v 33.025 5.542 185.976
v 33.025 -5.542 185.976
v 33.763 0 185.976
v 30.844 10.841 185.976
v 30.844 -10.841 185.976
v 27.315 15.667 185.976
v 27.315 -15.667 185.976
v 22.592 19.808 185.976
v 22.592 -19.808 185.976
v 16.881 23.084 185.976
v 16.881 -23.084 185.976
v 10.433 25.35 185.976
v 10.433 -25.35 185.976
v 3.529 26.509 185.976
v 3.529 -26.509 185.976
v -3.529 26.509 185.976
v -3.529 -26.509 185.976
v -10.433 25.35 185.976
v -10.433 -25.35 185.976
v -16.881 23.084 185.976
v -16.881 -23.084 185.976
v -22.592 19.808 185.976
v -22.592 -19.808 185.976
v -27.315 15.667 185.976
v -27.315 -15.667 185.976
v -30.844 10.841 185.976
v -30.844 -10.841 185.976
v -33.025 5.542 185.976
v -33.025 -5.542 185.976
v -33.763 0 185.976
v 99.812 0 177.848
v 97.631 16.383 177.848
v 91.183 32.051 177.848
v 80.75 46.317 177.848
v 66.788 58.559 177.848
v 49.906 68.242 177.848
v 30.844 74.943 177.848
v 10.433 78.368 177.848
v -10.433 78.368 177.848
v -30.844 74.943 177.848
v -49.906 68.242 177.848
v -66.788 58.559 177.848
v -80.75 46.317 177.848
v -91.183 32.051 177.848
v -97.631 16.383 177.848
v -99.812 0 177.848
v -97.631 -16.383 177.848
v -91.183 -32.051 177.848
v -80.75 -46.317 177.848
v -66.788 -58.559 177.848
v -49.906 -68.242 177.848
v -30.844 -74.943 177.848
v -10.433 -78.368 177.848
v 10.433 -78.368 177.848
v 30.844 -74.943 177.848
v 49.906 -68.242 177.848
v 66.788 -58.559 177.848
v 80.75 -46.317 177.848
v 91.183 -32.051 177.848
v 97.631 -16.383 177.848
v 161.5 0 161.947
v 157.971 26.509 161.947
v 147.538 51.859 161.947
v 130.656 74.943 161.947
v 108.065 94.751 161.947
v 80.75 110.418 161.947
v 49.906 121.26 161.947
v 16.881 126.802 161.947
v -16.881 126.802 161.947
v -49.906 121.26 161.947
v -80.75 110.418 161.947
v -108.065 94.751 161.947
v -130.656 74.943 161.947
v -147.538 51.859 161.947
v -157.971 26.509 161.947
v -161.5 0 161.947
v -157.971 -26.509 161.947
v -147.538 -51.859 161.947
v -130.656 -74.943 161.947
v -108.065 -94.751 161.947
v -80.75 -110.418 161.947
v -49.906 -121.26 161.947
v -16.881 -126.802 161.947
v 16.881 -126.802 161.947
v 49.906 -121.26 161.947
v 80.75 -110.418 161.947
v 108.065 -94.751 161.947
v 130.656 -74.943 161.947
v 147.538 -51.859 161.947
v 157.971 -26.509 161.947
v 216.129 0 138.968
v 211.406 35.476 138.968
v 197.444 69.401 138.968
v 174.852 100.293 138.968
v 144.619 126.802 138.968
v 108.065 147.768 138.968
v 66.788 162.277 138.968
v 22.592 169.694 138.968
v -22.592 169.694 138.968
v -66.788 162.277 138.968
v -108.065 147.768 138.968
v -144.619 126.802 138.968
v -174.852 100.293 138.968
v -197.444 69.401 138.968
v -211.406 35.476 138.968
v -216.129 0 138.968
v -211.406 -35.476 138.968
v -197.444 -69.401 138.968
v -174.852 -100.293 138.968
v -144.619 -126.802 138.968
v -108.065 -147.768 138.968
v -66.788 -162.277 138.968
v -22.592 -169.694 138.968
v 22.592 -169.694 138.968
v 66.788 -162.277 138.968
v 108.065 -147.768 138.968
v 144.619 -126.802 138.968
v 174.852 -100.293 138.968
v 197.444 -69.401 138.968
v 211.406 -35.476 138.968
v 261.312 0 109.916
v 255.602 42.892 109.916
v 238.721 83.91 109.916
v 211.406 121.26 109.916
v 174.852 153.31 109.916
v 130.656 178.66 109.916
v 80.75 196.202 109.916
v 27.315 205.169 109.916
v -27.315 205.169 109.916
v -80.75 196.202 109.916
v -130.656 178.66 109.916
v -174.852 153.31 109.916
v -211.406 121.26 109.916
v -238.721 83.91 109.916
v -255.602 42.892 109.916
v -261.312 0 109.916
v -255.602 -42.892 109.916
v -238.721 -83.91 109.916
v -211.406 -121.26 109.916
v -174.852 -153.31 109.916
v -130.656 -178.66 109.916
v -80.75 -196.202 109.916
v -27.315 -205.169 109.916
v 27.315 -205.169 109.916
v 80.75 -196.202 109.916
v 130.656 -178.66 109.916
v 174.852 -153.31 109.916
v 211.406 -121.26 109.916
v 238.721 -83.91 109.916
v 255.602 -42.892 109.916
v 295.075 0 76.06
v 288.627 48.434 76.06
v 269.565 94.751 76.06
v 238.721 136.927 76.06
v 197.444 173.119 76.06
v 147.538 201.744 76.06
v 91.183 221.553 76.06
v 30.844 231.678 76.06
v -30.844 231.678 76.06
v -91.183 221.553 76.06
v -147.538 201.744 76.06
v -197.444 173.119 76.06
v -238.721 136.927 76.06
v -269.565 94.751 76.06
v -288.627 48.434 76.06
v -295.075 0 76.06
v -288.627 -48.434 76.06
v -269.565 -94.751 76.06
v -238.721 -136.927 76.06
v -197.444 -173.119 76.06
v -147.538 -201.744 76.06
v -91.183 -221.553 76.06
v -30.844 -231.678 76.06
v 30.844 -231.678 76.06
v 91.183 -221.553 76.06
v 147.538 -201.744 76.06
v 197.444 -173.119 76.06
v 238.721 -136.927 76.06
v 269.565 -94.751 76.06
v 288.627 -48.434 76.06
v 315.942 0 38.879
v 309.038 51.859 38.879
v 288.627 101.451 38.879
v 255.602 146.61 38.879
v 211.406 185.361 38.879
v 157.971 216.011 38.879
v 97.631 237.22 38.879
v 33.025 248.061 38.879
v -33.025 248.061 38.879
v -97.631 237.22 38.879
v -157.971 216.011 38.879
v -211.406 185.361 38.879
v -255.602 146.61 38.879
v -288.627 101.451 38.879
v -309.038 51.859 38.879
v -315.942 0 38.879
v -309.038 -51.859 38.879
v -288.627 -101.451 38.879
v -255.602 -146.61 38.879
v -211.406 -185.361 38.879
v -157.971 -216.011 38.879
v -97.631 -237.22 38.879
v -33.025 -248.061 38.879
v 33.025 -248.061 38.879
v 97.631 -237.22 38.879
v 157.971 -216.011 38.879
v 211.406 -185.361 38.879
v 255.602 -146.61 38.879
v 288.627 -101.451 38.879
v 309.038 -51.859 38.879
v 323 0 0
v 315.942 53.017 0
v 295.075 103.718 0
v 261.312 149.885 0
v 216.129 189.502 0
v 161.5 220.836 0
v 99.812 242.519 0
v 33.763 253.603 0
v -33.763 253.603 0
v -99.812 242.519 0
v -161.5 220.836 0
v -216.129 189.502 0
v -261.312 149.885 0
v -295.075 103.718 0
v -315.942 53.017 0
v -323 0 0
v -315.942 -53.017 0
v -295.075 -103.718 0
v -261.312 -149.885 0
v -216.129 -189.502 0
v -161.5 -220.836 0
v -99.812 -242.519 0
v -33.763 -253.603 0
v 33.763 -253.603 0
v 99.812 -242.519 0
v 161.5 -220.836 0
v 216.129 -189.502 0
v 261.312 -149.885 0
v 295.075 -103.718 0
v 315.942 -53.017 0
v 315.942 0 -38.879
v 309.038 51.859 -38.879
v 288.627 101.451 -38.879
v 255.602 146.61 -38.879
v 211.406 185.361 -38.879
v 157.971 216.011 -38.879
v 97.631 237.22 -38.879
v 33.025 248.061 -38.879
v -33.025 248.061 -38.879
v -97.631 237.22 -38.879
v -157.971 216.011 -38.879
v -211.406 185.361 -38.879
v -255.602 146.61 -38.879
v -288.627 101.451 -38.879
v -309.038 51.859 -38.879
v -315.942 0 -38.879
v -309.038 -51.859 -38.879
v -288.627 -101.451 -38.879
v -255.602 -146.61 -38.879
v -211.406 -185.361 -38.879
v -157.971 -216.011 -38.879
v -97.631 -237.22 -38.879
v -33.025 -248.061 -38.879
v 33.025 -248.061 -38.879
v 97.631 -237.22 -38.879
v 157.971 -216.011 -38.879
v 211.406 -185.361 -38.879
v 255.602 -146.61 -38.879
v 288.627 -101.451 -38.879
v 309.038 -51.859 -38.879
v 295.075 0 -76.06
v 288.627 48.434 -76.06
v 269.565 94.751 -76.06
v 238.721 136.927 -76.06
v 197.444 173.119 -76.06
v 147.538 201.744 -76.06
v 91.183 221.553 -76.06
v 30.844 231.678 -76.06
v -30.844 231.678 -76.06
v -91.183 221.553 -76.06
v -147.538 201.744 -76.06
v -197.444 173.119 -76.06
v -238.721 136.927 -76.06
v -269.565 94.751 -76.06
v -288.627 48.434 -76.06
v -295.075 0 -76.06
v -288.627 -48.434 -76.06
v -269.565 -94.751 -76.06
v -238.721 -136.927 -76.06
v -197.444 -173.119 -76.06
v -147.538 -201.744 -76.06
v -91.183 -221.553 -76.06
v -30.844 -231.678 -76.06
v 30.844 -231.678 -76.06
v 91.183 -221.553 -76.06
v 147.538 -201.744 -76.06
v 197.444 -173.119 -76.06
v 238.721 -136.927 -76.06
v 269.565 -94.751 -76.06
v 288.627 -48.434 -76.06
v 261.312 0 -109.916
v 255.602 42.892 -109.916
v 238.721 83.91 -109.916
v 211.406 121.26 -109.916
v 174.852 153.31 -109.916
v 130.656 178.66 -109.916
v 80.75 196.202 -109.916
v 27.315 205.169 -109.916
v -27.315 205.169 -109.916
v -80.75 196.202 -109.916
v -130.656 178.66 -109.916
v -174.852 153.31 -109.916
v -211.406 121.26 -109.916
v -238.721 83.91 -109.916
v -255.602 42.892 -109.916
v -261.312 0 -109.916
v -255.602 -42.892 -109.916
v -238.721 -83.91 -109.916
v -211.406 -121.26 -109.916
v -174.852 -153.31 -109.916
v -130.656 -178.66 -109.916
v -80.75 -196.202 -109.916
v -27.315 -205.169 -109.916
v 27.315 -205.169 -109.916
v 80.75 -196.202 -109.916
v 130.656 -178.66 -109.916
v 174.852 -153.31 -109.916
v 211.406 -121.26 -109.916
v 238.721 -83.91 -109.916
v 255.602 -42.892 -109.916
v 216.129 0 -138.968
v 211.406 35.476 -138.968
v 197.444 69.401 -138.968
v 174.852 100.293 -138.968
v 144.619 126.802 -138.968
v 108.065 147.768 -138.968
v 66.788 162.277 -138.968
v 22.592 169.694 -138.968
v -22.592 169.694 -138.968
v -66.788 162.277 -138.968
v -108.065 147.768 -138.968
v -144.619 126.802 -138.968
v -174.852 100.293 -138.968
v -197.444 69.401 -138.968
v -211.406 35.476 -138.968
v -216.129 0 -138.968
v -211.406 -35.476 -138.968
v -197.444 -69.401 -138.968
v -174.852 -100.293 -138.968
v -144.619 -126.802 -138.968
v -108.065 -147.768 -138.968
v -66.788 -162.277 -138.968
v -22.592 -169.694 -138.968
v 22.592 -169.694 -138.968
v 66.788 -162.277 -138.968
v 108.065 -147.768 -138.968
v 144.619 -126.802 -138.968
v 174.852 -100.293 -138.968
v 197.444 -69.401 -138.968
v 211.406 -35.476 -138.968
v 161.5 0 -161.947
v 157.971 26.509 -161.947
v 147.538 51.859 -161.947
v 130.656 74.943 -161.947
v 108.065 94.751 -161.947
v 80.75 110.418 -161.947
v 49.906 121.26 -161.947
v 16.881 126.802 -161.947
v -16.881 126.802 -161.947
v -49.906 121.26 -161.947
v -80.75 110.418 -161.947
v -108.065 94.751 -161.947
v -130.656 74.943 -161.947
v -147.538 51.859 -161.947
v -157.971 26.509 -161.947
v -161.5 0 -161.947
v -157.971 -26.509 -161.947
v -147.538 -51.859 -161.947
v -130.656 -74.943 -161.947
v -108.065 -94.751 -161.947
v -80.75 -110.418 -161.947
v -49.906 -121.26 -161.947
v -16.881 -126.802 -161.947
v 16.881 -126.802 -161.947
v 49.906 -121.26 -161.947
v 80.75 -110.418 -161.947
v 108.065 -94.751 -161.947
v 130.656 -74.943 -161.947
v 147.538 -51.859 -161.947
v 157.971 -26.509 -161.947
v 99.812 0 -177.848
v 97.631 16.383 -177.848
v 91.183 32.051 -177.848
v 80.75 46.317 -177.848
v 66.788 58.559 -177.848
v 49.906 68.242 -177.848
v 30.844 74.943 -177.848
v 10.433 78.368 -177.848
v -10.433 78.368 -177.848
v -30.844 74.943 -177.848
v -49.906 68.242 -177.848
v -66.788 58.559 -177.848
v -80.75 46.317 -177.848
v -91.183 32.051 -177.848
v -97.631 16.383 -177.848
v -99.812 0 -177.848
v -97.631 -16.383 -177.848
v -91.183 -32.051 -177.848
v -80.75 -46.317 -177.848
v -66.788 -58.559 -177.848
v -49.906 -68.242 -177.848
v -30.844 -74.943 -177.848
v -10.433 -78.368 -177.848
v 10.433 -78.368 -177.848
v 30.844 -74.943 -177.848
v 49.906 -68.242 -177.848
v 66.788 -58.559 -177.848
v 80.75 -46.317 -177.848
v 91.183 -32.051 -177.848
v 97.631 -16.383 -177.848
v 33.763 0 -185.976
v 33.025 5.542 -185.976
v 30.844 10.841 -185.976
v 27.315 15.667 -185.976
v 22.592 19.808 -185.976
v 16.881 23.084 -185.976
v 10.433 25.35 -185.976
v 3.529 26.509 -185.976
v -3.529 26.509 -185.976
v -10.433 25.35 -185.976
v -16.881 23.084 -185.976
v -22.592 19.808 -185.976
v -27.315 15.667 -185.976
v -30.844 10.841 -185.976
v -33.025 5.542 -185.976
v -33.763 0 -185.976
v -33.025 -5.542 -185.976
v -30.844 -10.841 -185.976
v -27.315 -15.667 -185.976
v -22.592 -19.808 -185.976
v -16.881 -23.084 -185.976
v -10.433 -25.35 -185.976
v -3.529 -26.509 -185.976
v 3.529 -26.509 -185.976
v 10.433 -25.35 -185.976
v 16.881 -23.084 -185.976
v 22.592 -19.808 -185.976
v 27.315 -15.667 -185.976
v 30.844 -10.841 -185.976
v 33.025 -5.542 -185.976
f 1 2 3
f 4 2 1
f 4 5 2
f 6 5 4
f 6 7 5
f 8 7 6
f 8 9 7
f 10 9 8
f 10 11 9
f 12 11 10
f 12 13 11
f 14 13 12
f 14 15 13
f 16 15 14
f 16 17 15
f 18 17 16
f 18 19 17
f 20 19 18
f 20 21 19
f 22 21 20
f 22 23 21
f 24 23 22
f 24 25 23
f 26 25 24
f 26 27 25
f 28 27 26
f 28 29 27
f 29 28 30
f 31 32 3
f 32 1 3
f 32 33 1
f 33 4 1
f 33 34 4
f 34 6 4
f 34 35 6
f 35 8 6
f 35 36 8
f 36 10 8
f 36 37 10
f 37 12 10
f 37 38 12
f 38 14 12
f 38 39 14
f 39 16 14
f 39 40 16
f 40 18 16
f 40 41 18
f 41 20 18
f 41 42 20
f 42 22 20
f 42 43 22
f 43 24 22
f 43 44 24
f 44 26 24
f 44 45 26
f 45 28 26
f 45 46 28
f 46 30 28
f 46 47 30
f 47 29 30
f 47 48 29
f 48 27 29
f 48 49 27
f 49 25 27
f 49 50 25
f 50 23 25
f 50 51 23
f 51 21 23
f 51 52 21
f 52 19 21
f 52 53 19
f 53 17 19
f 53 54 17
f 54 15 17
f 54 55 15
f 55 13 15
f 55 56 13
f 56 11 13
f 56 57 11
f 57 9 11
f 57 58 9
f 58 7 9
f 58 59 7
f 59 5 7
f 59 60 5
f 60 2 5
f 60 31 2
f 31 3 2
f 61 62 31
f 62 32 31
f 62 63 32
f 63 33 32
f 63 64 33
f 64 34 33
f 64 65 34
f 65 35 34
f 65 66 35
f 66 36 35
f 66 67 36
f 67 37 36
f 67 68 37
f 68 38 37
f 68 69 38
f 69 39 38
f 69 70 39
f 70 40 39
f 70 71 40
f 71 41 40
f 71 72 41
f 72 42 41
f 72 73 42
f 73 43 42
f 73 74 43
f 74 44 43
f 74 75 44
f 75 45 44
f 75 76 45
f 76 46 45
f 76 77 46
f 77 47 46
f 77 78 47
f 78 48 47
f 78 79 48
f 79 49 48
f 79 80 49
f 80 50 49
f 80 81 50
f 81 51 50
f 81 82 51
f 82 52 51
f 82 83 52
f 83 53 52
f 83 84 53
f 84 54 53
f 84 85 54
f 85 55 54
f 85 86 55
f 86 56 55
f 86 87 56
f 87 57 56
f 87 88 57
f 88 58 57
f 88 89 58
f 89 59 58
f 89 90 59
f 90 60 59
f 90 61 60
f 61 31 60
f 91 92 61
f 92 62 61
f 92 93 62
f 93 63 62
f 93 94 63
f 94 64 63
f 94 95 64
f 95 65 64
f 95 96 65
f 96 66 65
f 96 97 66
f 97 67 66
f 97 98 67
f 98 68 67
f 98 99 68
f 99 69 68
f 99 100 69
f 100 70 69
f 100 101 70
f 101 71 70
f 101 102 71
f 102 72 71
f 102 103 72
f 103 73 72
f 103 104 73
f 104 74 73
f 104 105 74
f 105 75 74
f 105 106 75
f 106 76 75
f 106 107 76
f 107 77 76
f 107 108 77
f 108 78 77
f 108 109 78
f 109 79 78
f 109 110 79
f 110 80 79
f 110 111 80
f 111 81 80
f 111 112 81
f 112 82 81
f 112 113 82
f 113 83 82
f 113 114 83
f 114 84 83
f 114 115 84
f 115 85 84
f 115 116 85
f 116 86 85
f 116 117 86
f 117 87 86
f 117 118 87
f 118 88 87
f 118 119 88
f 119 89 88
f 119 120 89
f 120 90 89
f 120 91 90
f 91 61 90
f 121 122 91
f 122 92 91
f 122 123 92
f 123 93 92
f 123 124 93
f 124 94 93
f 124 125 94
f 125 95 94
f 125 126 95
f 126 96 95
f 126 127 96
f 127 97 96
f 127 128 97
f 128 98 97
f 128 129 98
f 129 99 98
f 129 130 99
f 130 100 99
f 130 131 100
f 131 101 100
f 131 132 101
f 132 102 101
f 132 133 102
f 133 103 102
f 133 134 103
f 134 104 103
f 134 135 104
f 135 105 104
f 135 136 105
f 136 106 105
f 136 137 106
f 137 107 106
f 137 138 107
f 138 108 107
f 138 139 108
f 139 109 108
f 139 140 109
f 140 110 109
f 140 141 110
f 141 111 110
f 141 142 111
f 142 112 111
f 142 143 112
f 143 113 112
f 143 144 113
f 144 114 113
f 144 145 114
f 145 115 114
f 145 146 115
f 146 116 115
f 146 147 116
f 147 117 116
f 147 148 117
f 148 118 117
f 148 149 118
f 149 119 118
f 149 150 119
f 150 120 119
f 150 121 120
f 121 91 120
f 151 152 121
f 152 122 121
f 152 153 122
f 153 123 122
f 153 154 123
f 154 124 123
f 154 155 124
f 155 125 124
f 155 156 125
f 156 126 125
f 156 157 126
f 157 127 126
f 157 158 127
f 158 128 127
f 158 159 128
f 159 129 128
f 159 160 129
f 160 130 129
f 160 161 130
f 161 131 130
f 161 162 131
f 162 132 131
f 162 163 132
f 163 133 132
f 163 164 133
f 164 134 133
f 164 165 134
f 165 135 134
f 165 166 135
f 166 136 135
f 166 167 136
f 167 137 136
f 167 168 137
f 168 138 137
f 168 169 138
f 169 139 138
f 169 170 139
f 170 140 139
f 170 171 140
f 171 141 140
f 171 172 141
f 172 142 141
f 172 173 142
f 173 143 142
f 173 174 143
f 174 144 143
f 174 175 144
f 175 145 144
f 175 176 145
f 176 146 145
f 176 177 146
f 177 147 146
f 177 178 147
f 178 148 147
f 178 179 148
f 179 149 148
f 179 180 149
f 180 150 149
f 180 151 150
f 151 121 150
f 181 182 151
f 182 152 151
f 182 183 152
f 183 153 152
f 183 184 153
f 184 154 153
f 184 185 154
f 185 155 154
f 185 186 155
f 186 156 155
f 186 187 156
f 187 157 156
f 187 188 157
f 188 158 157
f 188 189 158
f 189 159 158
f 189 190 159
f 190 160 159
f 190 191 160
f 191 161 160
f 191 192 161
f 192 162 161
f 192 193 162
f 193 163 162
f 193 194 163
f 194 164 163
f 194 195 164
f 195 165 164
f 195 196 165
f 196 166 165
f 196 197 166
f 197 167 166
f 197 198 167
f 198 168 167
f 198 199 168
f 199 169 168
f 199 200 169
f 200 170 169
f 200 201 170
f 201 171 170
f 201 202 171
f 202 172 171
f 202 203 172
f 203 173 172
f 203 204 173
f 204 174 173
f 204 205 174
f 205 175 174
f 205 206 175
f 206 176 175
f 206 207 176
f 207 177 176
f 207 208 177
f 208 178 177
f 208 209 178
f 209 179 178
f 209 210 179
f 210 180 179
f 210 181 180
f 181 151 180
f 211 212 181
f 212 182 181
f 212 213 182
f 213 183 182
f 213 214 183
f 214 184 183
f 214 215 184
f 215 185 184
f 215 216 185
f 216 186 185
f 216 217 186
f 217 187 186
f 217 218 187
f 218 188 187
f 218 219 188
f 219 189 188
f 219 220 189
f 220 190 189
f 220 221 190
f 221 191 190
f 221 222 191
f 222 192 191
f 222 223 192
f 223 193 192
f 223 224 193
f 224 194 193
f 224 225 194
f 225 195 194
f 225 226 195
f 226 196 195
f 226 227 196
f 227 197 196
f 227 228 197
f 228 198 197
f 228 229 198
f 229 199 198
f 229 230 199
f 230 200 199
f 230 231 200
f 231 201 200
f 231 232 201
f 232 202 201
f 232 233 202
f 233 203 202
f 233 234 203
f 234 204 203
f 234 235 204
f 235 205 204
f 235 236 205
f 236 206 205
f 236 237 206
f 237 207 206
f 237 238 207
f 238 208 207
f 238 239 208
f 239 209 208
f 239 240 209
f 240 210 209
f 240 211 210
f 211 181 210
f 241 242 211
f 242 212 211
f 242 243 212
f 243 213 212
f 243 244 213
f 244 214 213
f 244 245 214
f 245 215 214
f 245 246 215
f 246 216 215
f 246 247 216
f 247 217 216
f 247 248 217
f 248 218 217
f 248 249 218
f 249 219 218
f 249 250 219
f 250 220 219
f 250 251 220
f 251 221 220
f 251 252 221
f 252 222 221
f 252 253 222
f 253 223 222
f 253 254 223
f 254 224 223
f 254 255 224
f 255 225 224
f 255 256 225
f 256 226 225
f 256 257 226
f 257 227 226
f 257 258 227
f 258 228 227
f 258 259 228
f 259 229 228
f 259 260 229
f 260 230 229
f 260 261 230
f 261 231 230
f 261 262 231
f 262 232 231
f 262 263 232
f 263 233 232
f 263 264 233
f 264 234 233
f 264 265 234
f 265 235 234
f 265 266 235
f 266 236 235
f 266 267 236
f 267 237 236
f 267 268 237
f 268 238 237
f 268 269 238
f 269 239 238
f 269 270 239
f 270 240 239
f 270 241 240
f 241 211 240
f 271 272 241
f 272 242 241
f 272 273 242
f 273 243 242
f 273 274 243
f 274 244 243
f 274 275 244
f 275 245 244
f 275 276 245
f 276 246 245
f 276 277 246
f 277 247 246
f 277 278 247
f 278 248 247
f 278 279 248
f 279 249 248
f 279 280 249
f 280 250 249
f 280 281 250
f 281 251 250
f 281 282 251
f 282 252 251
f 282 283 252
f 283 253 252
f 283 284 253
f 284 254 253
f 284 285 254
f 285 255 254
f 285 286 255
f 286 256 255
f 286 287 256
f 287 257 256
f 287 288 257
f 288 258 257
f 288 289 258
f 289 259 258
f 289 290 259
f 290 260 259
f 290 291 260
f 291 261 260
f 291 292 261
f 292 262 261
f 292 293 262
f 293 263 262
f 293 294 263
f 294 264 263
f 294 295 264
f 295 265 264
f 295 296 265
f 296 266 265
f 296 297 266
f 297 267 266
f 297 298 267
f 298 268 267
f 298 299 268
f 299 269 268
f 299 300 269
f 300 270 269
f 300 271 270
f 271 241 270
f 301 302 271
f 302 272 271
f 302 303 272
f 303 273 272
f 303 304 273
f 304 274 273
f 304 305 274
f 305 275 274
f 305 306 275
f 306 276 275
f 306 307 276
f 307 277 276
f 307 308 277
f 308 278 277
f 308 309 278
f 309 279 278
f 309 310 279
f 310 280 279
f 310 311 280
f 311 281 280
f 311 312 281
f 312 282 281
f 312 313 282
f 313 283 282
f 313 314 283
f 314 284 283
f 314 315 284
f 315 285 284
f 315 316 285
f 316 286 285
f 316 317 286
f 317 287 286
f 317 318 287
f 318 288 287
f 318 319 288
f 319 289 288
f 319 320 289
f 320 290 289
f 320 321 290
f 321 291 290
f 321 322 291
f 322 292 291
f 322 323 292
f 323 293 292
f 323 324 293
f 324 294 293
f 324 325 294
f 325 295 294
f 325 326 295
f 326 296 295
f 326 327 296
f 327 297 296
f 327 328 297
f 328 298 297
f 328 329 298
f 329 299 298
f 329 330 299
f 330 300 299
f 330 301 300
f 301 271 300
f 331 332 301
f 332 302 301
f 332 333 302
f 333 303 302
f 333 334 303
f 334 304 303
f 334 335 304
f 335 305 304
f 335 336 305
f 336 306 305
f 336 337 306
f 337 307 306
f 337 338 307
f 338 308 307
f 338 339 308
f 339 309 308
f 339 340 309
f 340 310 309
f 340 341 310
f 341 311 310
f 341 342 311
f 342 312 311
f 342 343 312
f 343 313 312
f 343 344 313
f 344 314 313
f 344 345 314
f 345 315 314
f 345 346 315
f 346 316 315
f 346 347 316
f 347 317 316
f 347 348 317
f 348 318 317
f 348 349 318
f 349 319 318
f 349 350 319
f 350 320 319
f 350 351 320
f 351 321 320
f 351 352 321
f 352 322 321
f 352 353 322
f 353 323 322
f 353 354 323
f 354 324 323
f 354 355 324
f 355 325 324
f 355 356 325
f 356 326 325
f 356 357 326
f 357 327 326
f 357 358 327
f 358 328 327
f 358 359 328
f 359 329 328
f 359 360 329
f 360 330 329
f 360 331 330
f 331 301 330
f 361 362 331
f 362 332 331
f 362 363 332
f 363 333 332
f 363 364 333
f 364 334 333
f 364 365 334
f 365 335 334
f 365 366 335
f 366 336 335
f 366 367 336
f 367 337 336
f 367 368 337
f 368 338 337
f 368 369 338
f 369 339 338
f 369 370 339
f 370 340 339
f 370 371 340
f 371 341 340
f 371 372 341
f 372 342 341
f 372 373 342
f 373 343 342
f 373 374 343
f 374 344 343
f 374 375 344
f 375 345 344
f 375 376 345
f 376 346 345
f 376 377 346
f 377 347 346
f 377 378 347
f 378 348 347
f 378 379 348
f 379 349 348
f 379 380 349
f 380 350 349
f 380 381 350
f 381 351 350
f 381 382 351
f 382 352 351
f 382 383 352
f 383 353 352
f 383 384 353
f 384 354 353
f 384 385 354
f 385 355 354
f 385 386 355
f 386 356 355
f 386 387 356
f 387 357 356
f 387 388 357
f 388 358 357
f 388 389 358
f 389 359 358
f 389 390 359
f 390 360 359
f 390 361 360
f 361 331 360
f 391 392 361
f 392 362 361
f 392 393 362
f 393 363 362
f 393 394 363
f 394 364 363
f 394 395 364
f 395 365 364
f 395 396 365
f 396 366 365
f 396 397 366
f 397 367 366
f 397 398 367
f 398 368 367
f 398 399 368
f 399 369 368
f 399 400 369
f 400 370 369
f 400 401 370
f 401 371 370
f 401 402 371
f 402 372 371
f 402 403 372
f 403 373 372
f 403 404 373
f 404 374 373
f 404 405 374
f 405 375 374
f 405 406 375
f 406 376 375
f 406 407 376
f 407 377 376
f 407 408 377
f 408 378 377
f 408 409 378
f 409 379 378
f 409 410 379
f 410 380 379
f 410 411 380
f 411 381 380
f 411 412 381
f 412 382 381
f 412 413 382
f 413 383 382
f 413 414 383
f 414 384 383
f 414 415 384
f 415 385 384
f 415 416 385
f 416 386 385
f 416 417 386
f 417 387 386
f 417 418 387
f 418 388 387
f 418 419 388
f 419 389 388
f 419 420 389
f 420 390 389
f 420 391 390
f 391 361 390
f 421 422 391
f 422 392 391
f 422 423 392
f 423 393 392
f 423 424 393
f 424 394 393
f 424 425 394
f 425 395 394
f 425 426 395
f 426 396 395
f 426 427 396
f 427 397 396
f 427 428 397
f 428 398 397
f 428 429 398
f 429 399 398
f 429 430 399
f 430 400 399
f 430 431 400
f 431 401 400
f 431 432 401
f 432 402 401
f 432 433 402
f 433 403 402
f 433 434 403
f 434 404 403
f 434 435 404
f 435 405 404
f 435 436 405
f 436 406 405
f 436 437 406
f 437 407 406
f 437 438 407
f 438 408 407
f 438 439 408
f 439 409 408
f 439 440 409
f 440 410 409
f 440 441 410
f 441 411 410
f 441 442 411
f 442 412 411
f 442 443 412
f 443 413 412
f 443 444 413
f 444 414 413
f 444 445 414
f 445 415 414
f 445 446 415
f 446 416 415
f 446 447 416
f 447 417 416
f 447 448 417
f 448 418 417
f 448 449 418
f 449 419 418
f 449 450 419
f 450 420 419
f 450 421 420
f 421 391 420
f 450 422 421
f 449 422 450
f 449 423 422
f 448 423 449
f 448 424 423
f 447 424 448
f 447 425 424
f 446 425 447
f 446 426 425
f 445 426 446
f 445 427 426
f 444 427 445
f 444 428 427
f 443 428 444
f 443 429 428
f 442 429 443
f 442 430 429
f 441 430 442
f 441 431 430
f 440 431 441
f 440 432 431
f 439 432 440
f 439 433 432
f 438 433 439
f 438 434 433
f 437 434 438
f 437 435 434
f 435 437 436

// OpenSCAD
// Generated by SolidPython 1.0.1 on 2020-07-29 00:46:54


scale(v = [19, 15, 11]) {
	sphere(r = 17);
}
/***********************************************
*********      SolidPython code:      **********
************************************************
 
# import packages: SolidPython
from solid import *
from solid.utils import *
from itertools import chain, combinations, permutations


class Resize:

    def __init__(self, scad_file):
        self.scad_file = scad_file
        #self.scad_file = import_scad(scad_file)
        # cone/cylinder param:
        self.r1 = 0
        self.r2 = 0
        self.h = 0
        # rectangular prism param:
        self.w = 0
        self.l = 0
        # ellipse param:
        self.r = 0

    # import OpenScad code (file name corresponds to shape)


    # classify shape + parameters
    def assign(self, param1, param2, param3):
        if self.scad_file == 'cone.scad':
            self.r1 = param1
            self.r2 = param2
            self.h = param3
        elif self.scad_file == 'cylinder.scad':
            self.r1 = param1
            self.r2 = param2
            self.h = param3
        elif self.scad_file == 'rectangularPrism.scad':
            self.h = param1
            self.l = param2
            self.w = param3
        else:
            self.r = param1
            self.h = param2

    # resize parameters
    def iterate(self):
        x = range(3, 20, 2)
        i = 1
        if self.scad_file == 'cone.scad':
            tempList = list(permutations(x, 2))
            for temp in tempList:
                param1 = temp[0]
                param2 = temp[1]
                filepath = 'produced_scad_files/' + 'cone' + str(param1) + '_' + str(param2) + '_' + '.scad'
                scad_render_to_file(cylinder(h=param1, r1=param2, r2=0), filepath)

        elif self.scad_file == 'cylinder.scad':
            tempList = list(permutations(x, 3))
            for temp in tempList:
                param1 = temp[0]
                param2 = temp[1]
                filepath = 'produced_scad_files/' + 'cylinder' + str(param1) + '_' + str(param2) + '_' + '.scad'
                scad_render_to_file(cylinder(h=param1, r1=param2, r2=param2), filepath)

        elif self.scad_file == 'rectangularPrism.scad':
            tempList = list(permutations(x, 3))
            for temp in tempList:
                param1 = temp[0]
                param2 = temp[1]
                param3 = temp[2]
                filepath = 'produced_scad_files/' + 'rectangularPrism' + str(param1) + '_' + str(param2) + '_' + str(
                    param3) + '.scad'
                scad_render_to_file(cube(size=(param1, param2, param3)), filepath)

        elif self.scad_file == 'ellipse.scad':
            tempList = list(permutations(x, 4))
            for temp in tempList:
                param1 = temp[0]
                param2 = temp[1]
                param3 = temp[2]
                param4 = temp[3]
                filepath = 'produced_scad_files/' + 'ellipse' + str(param1) + '_' + str(param2) + '_' + str(param3) + '_' + str(param4) + '.scad'
                scad_render_to_file(scale([param1, param2, param3])(sphere(r=param4)), filepath)

    def render_to_scadfile(self):
        scad_render_to_file(scad, 'example.scad') 
 
************************************************/
